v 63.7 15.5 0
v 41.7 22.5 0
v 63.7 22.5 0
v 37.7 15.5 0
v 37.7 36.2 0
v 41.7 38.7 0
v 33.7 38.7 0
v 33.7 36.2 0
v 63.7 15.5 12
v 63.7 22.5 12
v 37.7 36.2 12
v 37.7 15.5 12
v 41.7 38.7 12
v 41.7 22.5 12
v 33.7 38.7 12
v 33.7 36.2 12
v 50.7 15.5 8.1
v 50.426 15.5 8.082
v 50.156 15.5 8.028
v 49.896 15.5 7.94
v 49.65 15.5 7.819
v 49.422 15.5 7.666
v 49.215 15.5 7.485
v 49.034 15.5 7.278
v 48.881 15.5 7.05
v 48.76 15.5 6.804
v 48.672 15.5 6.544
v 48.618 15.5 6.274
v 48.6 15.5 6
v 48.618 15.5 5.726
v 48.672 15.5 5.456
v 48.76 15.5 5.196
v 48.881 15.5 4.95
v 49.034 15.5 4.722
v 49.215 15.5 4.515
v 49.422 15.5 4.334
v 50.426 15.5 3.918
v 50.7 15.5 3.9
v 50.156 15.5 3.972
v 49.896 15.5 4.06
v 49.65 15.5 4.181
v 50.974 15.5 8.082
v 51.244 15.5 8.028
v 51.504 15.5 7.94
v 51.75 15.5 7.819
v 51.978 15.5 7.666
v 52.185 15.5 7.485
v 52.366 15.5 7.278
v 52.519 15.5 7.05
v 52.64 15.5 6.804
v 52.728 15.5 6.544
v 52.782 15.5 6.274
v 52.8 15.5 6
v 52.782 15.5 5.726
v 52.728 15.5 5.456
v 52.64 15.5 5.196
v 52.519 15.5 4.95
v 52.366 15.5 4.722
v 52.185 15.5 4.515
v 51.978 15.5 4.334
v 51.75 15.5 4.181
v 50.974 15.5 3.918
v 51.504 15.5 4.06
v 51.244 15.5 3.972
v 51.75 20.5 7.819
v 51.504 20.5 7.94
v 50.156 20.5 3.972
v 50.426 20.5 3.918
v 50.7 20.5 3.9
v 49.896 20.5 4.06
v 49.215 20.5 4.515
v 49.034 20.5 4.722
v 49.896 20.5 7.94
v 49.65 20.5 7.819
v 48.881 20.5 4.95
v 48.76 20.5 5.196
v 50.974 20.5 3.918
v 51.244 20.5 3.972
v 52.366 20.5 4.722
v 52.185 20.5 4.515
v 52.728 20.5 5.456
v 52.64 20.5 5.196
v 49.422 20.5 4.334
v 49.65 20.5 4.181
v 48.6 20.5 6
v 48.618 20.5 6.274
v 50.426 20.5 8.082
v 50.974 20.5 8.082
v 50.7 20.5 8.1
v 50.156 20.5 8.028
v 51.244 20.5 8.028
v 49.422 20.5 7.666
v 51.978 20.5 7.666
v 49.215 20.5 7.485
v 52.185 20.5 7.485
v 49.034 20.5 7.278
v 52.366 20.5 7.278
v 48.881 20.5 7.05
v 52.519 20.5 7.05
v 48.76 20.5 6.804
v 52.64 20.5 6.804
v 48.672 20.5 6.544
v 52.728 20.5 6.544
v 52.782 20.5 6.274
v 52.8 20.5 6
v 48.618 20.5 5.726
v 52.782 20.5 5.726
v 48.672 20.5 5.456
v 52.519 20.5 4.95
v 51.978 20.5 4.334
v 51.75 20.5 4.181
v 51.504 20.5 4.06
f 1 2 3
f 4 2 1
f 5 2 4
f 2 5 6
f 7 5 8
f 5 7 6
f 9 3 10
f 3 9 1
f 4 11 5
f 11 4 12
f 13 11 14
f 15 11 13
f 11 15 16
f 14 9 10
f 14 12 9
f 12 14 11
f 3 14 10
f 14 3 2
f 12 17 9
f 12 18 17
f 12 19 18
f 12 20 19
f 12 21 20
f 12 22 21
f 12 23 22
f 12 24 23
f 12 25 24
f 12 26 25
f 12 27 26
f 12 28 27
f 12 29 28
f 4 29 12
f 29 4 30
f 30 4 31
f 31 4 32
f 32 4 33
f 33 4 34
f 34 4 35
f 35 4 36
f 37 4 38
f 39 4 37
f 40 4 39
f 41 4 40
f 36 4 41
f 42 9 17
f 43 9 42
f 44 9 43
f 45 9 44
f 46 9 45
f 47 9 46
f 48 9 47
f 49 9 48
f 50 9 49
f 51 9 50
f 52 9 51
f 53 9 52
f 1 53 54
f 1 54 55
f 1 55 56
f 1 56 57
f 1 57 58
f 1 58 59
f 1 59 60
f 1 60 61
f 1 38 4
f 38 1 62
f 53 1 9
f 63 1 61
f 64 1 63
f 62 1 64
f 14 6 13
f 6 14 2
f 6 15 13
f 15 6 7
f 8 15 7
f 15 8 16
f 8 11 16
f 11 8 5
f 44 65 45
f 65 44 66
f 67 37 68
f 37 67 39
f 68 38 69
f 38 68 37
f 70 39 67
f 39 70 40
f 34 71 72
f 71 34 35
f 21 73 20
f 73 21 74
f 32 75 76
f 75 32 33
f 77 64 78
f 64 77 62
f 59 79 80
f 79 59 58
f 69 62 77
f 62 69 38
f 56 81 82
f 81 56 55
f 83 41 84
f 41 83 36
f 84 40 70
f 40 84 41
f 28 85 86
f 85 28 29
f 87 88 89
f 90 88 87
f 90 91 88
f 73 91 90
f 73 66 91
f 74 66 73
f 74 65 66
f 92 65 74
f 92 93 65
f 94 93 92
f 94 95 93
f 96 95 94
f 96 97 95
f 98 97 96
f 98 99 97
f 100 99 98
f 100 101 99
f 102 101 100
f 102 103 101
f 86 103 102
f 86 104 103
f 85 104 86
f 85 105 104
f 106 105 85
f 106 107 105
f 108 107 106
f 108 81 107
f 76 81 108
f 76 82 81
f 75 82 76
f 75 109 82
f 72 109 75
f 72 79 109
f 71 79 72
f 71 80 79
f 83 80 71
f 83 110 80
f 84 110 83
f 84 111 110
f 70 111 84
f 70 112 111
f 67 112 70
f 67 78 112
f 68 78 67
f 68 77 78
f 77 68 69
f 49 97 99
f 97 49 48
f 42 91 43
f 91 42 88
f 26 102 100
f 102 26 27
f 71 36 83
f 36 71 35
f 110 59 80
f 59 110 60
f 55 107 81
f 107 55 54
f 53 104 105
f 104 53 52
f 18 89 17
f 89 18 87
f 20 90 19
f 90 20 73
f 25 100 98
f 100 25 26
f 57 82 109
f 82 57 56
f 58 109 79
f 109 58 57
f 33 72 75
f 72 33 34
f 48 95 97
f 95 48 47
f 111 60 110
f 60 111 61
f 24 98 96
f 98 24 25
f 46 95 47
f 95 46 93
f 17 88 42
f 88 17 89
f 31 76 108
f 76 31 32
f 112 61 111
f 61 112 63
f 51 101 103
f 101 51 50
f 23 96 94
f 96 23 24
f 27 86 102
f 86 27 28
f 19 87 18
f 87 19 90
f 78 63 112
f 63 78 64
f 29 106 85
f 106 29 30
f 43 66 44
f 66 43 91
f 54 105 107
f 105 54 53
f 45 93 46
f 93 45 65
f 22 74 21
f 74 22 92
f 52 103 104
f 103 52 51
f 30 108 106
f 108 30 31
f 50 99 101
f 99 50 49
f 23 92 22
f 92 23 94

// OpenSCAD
// file: head_plate.scad
// =====================================================================
//  DeskMate DIY – PŁYTA GŁOWY (kołyska telefonu + kieszeń ładowarki)
//  Jedna płyta na profil telefonu:  -D 'profile="fold8_open"'
//  Układ: oś TILT = oś X, telefon z przodu (+Y). Druk: tyłem do stołu.
// =====================================================================
include <params.scad>

// ---------- geometria zależna od profilu ----------
function hp_zmin() = min(pad_cz() - pad_rp() - 4, ph_bot() - hook_h);
function hp_zmax() = max(pad_cz() + pad_rp() + 6, ph_top() - 4);
function clamp_z0() = ph_top() + tol;                       // spód haka zaczepu
function clamp_screw_z() = clamp_z0() + clamp_h / 2;        // środek regulacji
function chan_z0() = ph_top() - clamp_travel - 2;
function chan_z1() = clamp_z0() + clamp_h + clamp_travel + 1;
function ear_top() = chan_z1() + 4;
function shelf_y1() = lip_y0() + lip_t;
function hp_ttp_z() = hp_zmax();                            // górna krawędź na X = 0

// ---------- obrys płyty (2D, x -> X, y -> Z) ----------
module hp_outline() {
  union() {
    rrect([-head_half_w, hp_zmin()], [head_half_w, hp_zmax()], 5);
    // uszy na zaczepy
    for (s = [-1, 1])
      translate([s*clamp_x, 0])
        rrect([-clamp_w/2 - 5, hp_zmax() - 10], [clamp_w/2 + 5, ear_top()], 3);
    // język z kanałem kabla ładowarki
    translate([0, pad_cz()]) rotate(pad_port_angle)
      translate([0, -(port_w()/2 + 7)])
        square([pad_rp() + chan_len, port_w() + 14]);
  }
}

// ---------- otwory wentylacyjne poza ładowarką ----------
module hp_vent_keepout() {
  translate([0, pad_cz()]) circle(r = pad_rp() + 5);
  translate([0, pad_cz()]) rotate(pad_port_angle)
    translate([0, -(port_w()/2 + 10)]) square([pad_rp() + chan_len + 5, port_w() + 20]);
  for (s = [-1, 1]) translate([s*clamp_x, 0])
    translate([-clamp_w/2 - 6, chan_z0() - 4]) square([clamp_w + 12, 1000]);
  for (s = [-1, 1]) translate([s > 0 ? br_fl_x0 - 3 : -1000, -br_fl_hz - 4])
    square([1000 - br_fl_x0 + 3, 2*br_fl_hz + 8]);
  translate([-1000, -1000]) square([2000, ph_bot() + 4 + 1000]);   // półka
  translate([-1000, hp_zmax() - 10]) square([2000, 1000]);          // TTP / góra
  difference() { square(2000, center = true); offset(delta = -5) hp_outline(); }
}
module hp_vents2d() {
  difference() {
    for (x = [-46 : 9 : 46]) translate([x - 2, -500]) square([4, 1000]);
    hp_vent_keepout();
  }
}

// ---------- półka pod dolną krawędzią telefonu ----------
module hp_shelf() {
  difference() {
    union() {
      translate([-head_half_w, slab_front - 0.01, ph_bot() - hook_h])
        cube([2*head_half_w, shelf_y1() - slab_front, hook_h]);
      translate([-head_half_w, lip_y0(), ph_bot() - 0.01])
        cube([2*head_half_w, lip_t, lip_h]);
    }
    // wycięcie środkowe (przyciski / palec)
    translate([-shelf_cut_w/2, slab_front - 1, ph_bot() - hook_h - 1])
      cube([shelf_cut_w, 50, hook_h + lip_h + 2]);
  }
}

// ---------- płyta ----------
module head_plate() {
  pc = pad_cz();
  difference() {
    union() {
      xz_extrude(slab_back(), slab_front) hp_outline();
      hp_shelf();
    }
    // kieszeń ładowarki (wierzch ładowarki = tył telefonu)
    translate([0, 0, pc]) cyl_y(2*pad_rp(), pocket_floor(), 60);
    // kanał na wtyk / kabel ładowarki
    translate([0, 0, pc]) rotate([0, -pad_port_angle, 0])
      translate([pad_rp() - 3, pocket_floor(), -port_w()/2])
        cube([chan_len + 3 + 1, 60, port_w()]);
    // otwory na opaskę zaciskową (odciążenie kabla)
    translate([0, 0, pc]) rotate([0, -pad_port_angle, 0])
      for (s = [-1, 1])
        translate([pad_rp() + chan_len - 8, slab_back() - 1, s*(port_w()/2 + 3.2) - 1.5])
          cube([4, 50, 3]);
    // dno: szczeliny powietrza między żebrami
    translate([0, 0, pc]) xz_extrude(slab_back() - 1, pocket_floor() + 0.01)
      for (r = [pad_rp()*0.45, pad_rp()*0.72])
        if (r > (fan_on ? fan_size/2 + 3 : 6))
          for (a = [0 : 45 : 359]) arc_slot2d(r, 5, a + 9, a + 36);
    // otwór i mocowanie wentylatora 30x30 (z tyłu płyty)
    if (fan_on) translate([0, 0, pc]) {
      cyl_y(fan_size - 2, slab_back() - 1, pocket_floor() + 0.01);
      for (sx = [-1, 1], sz = [-1, 1])
        translate([sx*fan_pitch/2, 0, sz*fan_pitch/2]) cyl_y(m3_clear, slab_back() - 1, pocket_floor() + 1);
    }
    // wentylacja / odchudzenie poza ładowarką
    xz_extrude(slab_back() - 1, slab_front + 1) hp_vents2d();
    // śruby wsporników (łeb stożkowy od przodu – pod ładowarką lub telefonem)
    for (s = [-1, 1], p = br_screw) translate([s*p[0], 0, p[1]]) {
      cyl_y(m3_clear, slab_back() - 1, slab_front + 1);
      translate([0, slab_back() + floor_t - m3_csk_d/2, 0])
        rotate([-90, 0, 0]) cylinder(d1 = 0, d2 = m3_csk_d, h = m3_csk_d/2 + 0.01);
      cyl_y(m3_csk_d + 0.2, slab_back() + floor_t, slab_front + 1);
    }
    // kanały zaczepów górnych + szczelina regulacji
    for (s = [-1, 1]) translate([s*clamp_x, 0, 0]) {
      translate([-clamp_w/2 - tol, slab_front - clamp_t - 0.2, chan_z0()])
        cube([clamp_w + 2*tol, 20, chan_z1() - chan_z0()]);
      hull() for (dz = [-clamp_travel, clamp_travel])
        translate([0, 0, clamp_screw_z() + dz]) cyl_y(m3_clear, slab_back() - 1, slab_front);
    }
    // kieszeń czujnika dotyku TTP223 w górnej krawędzi + wyjście przewodu w tył
    translate([-ttp[0]/2, (slab_back() + slab_front)/2 - ttp[1]/2, hp_ttp_z() - ttp[2]])
      cube([ttp[0], ttp[1], 10]);
    translate([-3, slab_back() - 1, hp_ttp_z() - ttp[2]])
      cube([6, (slab_front - slab_back())/2 + 1, 10]);
  }
  // żebra pod ładowarką
  translate([0, 0, pc]) intersection() {
    xz_extrude(pocket_floor() - 0.01, pocket_floor() + rib_h) union() {
      for (a = [0 : 45 : 359]) rotate(a)
        translate([fan_on ? fan_size/2 - 1 : 6, -1.2]) square([pad_rp(), 2.4]);
      difference() { circle(r = pad_rp() + 0.1); circle(r = pad_rp() - 2.5); }
    }
    cyl_y(2*pad_rp() + 0.1, pocket_floor() - 1, pocket_floor() + rib_h + 1);
  }
}

// ---------- zaczep górny (2 szt. na profil) ----------
module clamp_part() {   // w układzie głowy, dla zaczepu przy +X (symetryczny)
  y_back = slab_front - clamp_t;
  difference() {
    union() {
      translate([-clamp_w/2, y_back, clamp_z0()]) cube([clamp_w, clamp_t, clamp_h]);
      translate([-clamp_w/2, y_back, clamp_z0()]) cube([clamp_w, shelf_y1() - y_back, 4]);
      translate([-clamp_w/2, lip_y0(), clamp_z0() - lip_h]) cube([clamp_w, lip_t, lip_h + 4]);
    }
    translate([0, y_back - 1, clamp_screw_z()]) cyl_y(ins_d, 0, ins_l - 1 + 1);
  }
}

if (is_undef(ASM)) {
  // ułożenie do druku: tył płyty na stole
  translate([0, 0, -slab_back()]) rotate([90, 0, 0]) head_plate();
}
// main file
// =====================================================================
//  DeskMate DIY – ZACZEP GÓRNY telefonu (2 szt. na profil)
//  Stopa wchodzi w kanał płyty głowy; śruba M3x12 od tyłu płyty przez
//  szczelinę regulacji do wkładki w stopie. Druk: bokiem na stole.
// =====================================================================
ASM = true;
include <head_plate.scad>

translate([0, 0, clamp_w/2]) rotate([0, 90, 0]) clamp_part();
